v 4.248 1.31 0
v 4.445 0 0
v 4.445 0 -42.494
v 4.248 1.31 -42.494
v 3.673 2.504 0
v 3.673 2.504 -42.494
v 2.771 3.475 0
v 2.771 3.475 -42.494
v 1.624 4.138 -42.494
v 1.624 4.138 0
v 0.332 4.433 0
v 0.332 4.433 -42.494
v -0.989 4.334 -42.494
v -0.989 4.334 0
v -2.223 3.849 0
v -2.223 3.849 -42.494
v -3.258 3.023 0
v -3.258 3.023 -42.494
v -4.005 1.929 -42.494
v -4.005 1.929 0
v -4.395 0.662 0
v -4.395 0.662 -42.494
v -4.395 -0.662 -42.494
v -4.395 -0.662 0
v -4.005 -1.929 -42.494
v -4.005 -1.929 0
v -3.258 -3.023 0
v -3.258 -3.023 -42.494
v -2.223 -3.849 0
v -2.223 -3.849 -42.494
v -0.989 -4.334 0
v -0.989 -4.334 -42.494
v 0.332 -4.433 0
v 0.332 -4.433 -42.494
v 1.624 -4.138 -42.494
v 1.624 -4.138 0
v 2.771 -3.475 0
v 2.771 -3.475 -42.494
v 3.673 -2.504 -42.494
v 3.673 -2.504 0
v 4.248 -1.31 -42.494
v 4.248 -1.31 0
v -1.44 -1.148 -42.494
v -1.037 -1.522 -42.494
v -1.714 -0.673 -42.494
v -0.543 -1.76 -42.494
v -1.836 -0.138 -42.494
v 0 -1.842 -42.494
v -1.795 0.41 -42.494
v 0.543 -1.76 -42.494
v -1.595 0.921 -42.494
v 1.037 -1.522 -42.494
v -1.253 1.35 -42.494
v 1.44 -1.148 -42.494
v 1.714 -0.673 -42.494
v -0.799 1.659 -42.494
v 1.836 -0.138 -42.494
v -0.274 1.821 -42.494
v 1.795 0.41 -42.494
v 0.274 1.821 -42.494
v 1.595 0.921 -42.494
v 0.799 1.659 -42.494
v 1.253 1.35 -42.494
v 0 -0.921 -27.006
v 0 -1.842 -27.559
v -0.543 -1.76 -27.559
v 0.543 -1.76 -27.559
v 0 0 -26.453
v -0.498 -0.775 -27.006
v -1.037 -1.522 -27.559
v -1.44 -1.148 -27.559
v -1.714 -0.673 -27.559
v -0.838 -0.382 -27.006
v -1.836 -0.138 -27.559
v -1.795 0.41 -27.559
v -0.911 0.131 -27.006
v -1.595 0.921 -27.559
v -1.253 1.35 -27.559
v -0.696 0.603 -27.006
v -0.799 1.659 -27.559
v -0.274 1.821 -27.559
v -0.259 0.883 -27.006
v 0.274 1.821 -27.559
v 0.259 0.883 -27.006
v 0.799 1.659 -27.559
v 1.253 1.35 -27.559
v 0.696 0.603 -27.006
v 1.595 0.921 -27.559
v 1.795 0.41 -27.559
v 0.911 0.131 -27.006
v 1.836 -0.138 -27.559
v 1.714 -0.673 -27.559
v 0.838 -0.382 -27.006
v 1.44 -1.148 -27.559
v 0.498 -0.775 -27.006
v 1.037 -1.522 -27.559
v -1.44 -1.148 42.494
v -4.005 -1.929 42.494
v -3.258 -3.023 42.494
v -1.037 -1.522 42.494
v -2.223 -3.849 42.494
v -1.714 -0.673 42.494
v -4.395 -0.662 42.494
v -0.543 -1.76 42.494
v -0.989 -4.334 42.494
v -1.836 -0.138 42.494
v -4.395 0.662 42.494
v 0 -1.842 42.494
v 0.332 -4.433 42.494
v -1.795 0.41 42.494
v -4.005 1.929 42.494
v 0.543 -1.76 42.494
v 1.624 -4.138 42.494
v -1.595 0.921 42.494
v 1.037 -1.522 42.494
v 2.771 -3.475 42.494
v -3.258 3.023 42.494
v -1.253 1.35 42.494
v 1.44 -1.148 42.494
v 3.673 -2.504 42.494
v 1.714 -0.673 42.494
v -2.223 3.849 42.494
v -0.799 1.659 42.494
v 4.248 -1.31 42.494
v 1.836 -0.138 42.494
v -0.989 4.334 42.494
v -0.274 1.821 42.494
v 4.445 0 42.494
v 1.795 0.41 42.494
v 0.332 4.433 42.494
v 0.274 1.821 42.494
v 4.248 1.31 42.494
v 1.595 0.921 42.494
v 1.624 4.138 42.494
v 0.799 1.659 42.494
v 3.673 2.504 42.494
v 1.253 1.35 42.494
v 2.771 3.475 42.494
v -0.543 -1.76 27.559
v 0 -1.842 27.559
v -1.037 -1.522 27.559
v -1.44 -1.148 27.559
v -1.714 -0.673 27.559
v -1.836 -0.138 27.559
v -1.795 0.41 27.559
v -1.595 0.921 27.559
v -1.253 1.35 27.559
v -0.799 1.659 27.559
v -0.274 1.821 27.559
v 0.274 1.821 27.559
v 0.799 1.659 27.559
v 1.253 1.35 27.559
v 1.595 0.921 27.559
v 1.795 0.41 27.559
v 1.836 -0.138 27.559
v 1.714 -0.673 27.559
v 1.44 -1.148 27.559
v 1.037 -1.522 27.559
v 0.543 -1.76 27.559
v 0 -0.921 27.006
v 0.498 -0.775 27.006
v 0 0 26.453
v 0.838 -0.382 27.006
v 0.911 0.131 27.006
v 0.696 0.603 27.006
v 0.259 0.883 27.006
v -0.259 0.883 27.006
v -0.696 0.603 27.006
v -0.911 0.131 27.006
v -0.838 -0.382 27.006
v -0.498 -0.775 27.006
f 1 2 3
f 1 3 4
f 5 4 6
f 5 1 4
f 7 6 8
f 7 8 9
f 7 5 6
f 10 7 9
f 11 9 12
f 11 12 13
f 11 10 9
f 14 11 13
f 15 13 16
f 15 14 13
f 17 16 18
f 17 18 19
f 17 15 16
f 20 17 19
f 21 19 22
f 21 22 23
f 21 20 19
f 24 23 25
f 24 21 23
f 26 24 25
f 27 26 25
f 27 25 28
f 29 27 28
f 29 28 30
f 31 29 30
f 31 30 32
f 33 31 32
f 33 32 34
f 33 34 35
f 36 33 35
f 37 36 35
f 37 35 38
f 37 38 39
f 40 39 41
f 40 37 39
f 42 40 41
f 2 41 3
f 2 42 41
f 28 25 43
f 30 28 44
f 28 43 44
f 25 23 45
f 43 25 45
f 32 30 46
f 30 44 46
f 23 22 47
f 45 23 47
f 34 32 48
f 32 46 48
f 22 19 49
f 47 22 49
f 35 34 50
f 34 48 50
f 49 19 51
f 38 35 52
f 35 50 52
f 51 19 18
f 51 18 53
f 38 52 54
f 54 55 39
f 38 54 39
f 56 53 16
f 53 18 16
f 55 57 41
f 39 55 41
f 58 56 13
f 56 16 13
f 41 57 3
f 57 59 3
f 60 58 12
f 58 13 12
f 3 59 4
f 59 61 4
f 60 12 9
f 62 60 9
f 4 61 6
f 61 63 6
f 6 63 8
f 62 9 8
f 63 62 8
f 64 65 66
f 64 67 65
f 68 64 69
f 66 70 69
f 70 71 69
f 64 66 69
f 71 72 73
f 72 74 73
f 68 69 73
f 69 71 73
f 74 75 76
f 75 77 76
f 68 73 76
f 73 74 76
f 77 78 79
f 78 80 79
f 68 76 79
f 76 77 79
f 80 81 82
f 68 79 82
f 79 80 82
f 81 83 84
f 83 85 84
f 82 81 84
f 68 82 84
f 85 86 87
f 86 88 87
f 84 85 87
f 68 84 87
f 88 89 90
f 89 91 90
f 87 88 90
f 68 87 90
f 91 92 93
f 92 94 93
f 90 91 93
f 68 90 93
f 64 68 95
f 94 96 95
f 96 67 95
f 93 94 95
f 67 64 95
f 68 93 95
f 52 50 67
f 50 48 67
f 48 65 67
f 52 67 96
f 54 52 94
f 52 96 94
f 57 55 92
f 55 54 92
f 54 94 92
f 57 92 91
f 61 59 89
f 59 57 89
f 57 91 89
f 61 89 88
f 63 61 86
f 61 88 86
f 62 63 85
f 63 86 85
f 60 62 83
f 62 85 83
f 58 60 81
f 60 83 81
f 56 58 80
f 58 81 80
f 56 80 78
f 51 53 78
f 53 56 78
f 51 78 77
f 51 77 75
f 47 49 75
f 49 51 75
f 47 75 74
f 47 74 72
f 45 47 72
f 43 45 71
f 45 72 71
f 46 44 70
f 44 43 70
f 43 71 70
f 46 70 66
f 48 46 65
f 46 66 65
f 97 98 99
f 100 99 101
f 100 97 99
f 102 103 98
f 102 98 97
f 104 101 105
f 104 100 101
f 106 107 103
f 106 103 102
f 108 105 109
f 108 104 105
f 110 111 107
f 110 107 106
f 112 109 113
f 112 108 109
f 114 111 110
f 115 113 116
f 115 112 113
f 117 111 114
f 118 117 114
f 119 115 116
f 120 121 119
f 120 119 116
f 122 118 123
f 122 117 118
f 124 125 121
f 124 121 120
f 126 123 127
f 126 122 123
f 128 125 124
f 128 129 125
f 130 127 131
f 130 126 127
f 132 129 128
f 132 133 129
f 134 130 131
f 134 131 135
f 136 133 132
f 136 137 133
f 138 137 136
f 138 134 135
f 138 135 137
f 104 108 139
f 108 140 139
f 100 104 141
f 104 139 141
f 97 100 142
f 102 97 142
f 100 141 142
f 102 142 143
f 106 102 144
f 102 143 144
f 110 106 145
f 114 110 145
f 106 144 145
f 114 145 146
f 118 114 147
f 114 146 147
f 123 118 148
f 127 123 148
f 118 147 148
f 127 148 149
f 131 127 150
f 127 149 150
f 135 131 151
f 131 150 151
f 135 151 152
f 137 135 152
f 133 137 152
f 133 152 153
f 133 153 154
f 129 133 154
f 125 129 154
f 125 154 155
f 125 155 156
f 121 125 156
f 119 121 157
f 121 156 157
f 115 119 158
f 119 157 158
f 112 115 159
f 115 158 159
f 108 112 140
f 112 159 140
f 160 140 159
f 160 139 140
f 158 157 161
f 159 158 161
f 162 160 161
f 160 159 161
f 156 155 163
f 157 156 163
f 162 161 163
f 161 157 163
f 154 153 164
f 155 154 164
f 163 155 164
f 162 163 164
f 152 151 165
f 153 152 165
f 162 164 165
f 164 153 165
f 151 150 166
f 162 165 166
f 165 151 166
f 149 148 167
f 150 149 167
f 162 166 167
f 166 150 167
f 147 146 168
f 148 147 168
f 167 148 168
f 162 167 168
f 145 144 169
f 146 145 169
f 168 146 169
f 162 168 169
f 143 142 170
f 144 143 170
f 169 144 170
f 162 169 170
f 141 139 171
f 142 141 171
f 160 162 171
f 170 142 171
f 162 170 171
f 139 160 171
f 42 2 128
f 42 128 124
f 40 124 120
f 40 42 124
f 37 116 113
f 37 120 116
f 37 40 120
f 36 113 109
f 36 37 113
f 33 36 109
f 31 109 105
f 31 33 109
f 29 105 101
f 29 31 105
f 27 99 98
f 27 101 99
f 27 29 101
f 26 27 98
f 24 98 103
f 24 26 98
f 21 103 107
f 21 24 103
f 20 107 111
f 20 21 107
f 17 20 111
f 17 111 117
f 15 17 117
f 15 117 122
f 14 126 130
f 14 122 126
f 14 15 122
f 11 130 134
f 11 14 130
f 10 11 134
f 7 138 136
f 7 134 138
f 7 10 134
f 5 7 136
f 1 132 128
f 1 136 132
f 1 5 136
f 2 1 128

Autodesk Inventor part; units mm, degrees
ref_plane "YZ Plane" through (0, 0, 0) normal (1, 0, 0) x (0, 1, 0)
ref_plane "XZ Plane" through (0, 0, 0) normal (0, 1, 0) x (-1, 0, 0)
sketch "Sketch1" plane through (0, 0, 0) normal (0, 0, 1) x (1, 0, 0)
  circle A0 centre (0, 0) radius 4.445
  dimension "d1" = 8.89
extrude "Extrusion1" add sketch "Sketch1" along normal mid plane 84.9884
ref_plane "Work Plane1" through (0, 0, 0) normal (0, 0, 1) x (1, 0, 0)
sketch "Sketch2" plane through (0, 0, 42.4942) normal (0, 0, 1) x (1, 0, 0)
  point P0 (0, 0)
hole "Hole1" at (0, 0, 42.4942) direction (0, 0, -1) diameter 3.683 depth 14.9352 tip angle 118 thread size "10-24 UNC" class "2B" standard "ANSI Unified Screw Threads"
mirror "Mirror1" about plane through (0, 0, 0) normal (0, 0, 1) of "Hole1"
properties part number "drive train standoff"
